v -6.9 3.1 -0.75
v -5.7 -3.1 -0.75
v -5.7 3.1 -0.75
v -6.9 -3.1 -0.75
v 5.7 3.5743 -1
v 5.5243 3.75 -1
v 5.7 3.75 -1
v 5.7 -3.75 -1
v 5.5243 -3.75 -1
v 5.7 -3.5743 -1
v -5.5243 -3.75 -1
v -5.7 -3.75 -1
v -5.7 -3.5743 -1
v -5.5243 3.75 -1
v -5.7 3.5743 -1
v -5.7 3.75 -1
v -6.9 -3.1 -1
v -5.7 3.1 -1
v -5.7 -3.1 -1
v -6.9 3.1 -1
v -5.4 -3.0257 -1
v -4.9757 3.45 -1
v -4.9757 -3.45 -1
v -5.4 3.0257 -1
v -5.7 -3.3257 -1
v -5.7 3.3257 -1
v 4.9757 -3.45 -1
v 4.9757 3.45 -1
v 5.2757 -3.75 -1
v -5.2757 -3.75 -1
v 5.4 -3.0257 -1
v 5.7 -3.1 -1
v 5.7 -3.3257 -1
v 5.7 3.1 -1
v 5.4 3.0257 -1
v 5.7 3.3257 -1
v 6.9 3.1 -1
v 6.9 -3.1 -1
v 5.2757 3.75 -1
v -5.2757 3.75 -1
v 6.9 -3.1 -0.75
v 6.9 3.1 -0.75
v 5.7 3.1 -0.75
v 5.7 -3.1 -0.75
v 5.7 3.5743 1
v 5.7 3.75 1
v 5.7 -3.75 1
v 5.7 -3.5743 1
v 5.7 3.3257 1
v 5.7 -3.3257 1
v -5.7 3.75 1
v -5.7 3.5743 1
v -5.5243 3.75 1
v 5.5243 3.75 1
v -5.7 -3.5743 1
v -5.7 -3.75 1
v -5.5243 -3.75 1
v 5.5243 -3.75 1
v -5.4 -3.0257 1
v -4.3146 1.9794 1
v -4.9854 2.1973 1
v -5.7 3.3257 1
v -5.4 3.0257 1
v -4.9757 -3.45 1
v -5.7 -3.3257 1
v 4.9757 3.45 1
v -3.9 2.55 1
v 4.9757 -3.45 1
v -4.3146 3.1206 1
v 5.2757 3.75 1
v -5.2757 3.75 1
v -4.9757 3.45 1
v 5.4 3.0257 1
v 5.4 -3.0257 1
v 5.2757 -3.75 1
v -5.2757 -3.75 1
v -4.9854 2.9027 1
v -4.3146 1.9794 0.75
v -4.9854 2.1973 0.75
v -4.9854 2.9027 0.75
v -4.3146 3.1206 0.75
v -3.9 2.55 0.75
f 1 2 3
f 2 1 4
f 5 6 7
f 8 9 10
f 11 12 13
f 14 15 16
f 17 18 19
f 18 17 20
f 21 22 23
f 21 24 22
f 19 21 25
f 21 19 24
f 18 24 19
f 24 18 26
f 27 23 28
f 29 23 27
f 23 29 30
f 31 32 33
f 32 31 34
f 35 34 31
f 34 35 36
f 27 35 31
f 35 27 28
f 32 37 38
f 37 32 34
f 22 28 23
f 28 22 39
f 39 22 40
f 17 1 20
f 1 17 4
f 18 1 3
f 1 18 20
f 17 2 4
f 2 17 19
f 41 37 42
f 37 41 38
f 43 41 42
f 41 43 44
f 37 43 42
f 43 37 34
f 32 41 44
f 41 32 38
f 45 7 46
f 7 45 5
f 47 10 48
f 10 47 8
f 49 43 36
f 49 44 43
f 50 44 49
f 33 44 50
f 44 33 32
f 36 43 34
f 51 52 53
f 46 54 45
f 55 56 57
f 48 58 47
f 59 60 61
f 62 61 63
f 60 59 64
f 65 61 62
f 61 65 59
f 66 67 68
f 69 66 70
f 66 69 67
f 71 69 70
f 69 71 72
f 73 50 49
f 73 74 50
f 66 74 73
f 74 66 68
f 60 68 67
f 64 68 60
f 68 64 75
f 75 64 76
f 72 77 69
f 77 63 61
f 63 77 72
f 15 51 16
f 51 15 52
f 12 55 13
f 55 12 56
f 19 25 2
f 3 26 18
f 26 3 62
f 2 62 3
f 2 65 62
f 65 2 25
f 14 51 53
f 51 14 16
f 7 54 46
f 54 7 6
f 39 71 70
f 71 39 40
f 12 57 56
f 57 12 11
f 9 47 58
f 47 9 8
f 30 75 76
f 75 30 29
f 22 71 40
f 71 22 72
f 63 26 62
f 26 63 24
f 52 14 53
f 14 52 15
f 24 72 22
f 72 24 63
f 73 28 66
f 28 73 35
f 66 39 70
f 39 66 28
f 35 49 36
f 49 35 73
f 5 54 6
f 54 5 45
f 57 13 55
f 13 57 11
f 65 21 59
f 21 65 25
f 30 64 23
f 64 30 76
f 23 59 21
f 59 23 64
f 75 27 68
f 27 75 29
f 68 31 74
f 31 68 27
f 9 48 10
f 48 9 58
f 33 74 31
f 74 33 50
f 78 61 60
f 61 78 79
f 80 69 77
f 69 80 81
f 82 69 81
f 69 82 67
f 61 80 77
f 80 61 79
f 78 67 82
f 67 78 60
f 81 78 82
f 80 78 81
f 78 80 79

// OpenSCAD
// Parameters
body_length = 11.4; //[5.7:22.8:0.1]
body_width = 7.5; //[3.75:15:0.1]
body_height = 2; //[1:4:0.05]
mark_diameter = 1.2; //[0.6:2.4:0.05]
mark_depth = 0.25; //[0.1:0.6:0.05]
mark_edge_offset = 1.2; //[0.6:2.4:0.05]
chamfer_size = 0.6; //[0.2:1.2:0.05]
pin_length = 1.2; //[0.6:2.4:0.05]
pin_thickness = 0.25; //[0.1:0.6:0.05]
pin_width = 6.2; //[3:7.4:0.1]
overlap = 0.8; //[0.3:1.5:0.05]

// SMD Body
module smd_body() {
  color([0.85, 0.85, 0.8]) // Off-white for SMD package
  cube([body_length, body_width, body_height], center=true);
}

// Polarity Mark
module polarity_mark() {
  translate([-body_length/2 + mark_edge_offset, body_width/2 - mark_edge_offset, body_height/2 - mark_depth/2])
    color("Black")
    cylinder(h=mark_depth, r=mark_diameter/2, center=true);
}

// Edge Chamfer
module edge_chamfer() {
  color([0.85, 0.85, 0.8])
  union() {
    translate([-body_length/2 + chamfer_size/2, body_width/2 - chamfer_size/2, 0])
      rotate([0, 0, 45])
      cube([chamfer_size, chamfer_size, body_height], center=true);
    translate([body_length/2 - chamfer_size/2, body_width/2 - chamfer_size/2, 0])
      rotate([0, 0, 45])
      cube([chamfer_size, chamfer_size, body_height], center=true);
    translate([-body_length/2 + chamfer_size/2, -body_width/2 + chamfer_size/2, 0])
      rotate([0, 0, 45])
      cube([chamfer_size, chamfer_size, body_height], center=true);
    translate([body_length/2 - chamfer_size/2, -body_width/2 + chamfer_size/2, 0])
      rotate([0, 0, 45])
      cube([chamfer_size, chamfer_size, body_height], center=true);
  }
}

// Pin Terminations
module pin_terminations() {
  color("Silver") // Silver for pin terminations
  union() {
    translate([-body_length/2 - pin_length/2 + overlap/2, 0, -body_height/2 + pin_thickness/2])
      cube([pin_length + overlap, pin_width, pin_thickness], center=true);
    translate([body_length/2 + pin_length/2 - overlap/2, 0, -body_height/2 + pin_thickness/2])
      cube([pin_length + overlap, pin_width, pin_thickness], center=true);
  }
}

// Complete SMD Package
module smd_complete() {
  difference() {
    union() {
      smd_body();
      pin_terminations();
    }
    edge_chamfer();
    polarity_mark();
  }
}

// Render the final SMD package
smd_complete();
